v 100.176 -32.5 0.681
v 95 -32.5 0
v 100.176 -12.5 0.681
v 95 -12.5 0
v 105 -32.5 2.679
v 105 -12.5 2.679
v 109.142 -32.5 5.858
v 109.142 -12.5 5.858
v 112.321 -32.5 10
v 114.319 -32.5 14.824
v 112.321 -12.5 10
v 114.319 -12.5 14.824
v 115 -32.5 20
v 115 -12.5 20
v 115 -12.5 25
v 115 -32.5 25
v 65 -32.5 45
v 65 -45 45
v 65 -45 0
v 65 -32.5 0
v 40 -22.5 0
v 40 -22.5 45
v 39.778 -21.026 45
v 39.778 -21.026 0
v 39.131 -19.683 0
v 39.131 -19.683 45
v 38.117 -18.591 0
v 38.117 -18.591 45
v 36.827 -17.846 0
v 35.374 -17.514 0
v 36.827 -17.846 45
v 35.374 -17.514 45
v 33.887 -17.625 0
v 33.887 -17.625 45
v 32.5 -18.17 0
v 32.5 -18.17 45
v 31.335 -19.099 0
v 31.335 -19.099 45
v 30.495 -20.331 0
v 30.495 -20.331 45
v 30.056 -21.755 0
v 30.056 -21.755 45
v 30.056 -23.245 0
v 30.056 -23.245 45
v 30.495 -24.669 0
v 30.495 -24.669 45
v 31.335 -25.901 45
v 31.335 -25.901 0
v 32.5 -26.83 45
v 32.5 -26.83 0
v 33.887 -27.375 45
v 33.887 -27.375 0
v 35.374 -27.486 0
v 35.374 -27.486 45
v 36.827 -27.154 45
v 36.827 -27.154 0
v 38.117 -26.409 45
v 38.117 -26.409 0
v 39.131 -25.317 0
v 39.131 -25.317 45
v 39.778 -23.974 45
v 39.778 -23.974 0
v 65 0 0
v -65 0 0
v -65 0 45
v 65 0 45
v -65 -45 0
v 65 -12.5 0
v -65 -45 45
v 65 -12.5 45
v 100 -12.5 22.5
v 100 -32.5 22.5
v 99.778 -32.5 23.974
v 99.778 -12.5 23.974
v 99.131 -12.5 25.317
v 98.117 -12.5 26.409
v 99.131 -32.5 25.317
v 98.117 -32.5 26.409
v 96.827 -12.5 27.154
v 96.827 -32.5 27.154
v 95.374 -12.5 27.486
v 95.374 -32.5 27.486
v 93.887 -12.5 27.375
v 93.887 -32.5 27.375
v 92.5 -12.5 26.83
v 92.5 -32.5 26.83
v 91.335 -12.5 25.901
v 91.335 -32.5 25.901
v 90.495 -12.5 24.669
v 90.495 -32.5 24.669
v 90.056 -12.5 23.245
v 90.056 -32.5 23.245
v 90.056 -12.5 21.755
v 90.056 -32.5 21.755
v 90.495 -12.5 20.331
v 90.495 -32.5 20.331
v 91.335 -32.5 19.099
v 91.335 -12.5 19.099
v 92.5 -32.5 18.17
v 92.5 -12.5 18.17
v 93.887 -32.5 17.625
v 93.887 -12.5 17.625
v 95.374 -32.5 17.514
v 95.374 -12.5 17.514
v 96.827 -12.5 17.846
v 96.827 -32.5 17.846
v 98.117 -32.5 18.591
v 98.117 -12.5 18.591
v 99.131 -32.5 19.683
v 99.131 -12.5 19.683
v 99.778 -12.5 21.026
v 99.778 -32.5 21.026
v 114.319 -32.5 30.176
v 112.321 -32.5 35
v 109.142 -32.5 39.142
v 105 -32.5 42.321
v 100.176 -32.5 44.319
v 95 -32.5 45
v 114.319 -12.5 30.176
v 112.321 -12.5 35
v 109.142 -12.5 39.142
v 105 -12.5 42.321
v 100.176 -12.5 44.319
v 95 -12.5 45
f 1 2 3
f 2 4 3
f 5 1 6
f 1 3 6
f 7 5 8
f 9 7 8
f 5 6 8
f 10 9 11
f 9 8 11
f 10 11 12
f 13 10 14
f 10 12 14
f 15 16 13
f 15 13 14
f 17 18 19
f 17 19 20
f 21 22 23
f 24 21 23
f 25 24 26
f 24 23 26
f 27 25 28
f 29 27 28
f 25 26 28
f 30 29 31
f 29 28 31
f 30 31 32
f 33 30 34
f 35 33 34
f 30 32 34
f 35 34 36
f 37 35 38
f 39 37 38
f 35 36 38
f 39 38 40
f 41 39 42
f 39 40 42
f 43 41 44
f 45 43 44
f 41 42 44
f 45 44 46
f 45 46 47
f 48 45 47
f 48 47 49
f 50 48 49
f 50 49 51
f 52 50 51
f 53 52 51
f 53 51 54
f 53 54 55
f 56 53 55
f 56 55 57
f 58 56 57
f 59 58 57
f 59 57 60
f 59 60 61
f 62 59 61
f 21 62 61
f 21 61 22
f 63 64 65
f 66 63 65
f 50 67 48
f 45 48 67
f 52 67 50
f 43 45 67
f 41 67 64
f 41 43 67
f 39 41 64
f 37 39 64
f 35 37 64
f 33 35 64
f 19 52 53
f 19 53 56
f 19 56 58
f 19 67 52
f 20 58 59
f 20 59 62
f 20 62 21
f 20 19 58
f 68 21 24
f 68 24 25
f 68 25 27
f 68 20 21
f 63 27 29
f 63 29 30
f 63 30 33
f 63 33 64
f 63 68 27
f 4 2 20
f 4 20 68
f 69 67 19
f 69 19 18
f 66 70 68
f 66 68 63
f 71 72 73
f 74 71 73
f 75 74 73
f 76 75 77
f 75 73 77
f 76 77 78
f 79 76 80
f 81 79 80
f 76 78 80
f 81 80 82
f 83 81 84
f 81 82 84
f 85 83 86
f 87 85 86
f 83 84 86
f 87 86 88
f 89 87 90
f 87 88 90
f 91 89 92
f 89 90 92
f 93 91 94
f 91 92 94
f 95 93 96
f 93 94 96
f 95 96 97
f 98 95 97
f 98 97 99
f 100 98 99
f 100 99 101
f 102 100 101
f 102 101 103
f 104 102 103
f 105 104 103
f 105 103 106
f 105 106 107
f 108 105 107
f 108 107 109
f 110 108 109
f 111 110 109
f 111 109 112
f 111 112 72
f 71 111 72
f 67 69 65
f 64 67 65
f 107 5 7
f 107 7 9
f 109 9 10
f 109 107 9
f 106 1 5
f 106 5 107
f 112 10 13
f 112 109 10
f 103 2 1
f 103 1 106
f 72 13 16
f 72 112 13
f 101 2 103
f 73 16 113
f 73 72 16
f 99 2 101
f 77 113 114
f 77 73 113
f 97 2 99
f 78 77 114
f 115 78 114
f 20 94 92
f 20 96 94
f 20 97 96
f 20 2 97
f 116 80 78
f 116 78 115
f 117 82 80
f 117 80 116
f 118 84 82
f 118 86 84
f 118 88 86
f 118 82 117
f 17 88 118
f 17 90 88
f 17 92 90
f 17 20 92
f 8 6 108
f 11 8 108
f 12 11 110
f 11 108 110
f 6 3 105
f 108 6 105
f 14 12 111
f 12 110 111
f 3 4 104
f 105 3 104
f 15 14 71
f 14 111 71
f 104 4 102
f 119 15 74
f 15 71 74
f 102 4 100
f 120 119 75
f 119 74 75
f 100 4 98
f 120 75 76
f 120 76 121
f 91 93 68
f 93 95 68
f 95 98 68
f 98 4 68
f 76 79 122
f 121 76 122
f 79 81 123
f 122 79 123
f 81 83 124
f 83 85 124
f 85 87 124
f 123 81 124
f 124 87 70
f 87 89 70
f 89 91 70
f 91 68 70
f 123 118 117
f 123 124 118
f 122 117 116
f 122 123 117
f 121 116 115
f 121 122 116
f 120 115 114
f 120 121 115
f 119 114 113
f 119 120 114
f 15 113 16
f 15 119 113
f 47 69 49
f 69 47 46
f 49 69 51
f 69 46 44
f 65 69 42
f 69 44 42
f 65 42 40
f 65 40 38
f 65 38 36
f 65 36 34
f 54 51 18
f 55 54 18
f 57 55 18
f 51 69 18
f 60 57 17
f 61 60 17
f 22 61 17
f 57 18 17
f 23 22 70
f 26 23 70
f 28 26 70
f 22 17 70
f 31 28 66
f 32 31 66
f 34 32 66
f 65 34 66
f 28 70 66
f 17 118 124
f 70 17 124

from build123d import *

# Parameters (mm, degrees)
F0_W     = 45
F0_H     = 45
F1_DEPTH = 65
F2_R     = 5
F3_DEPTH = 45.001
F4_W     = 20
F4_H     = 45
F5_DEPTH = 50
F6_R     = 20
F7_R     = 5
F8_DEPTH = 25


with BuildPart() as f1:
    # F0 (on Right) → F1 (new body, symmetric)
    with BuildSketch(Plane.YZ):
        with Locations((-22.5, 22.5)):
            Rectangle(F0_W, F0_H)
    extrude(amount=F1_DEPTH, both=True)

    # F2 (on face) → F3 (cut, through all)
    with BuildSketch(Plane.XY.offset(45)):
        with Locations((35, -22.5)):
            Circle(F2_R)
    extrude(amount=-F3_DEPTH, mode=Mode.SUBTRACT)

    # F4 (on face) → F5 (join)
    with BuildSketch(Plane.YZ.offset(65)):
        with Locations((-22.5, 22.5)):
            Rectangle(F4_W, F4_H)
    extrude(amount=F5_DEPTH)

    # F6
    f6_edges = [f1.edges().sort_by_distance(p)[0] for p in [
        (115, -22.5, 45),
        (115, -22.5, 0),
    ]]
    fillet(f6_edges, radius=F6_R)

    # F7 (on face) → F8 (cut)
    with BuildSketch(Plane.XZ.offset(32.5)):
        with Locations((95, 22.5)):
            Circle(F7_R)
    extrude(amount=-F8_DEPTH, mode=Mode.SUBTRACT)


solid = f1.part
